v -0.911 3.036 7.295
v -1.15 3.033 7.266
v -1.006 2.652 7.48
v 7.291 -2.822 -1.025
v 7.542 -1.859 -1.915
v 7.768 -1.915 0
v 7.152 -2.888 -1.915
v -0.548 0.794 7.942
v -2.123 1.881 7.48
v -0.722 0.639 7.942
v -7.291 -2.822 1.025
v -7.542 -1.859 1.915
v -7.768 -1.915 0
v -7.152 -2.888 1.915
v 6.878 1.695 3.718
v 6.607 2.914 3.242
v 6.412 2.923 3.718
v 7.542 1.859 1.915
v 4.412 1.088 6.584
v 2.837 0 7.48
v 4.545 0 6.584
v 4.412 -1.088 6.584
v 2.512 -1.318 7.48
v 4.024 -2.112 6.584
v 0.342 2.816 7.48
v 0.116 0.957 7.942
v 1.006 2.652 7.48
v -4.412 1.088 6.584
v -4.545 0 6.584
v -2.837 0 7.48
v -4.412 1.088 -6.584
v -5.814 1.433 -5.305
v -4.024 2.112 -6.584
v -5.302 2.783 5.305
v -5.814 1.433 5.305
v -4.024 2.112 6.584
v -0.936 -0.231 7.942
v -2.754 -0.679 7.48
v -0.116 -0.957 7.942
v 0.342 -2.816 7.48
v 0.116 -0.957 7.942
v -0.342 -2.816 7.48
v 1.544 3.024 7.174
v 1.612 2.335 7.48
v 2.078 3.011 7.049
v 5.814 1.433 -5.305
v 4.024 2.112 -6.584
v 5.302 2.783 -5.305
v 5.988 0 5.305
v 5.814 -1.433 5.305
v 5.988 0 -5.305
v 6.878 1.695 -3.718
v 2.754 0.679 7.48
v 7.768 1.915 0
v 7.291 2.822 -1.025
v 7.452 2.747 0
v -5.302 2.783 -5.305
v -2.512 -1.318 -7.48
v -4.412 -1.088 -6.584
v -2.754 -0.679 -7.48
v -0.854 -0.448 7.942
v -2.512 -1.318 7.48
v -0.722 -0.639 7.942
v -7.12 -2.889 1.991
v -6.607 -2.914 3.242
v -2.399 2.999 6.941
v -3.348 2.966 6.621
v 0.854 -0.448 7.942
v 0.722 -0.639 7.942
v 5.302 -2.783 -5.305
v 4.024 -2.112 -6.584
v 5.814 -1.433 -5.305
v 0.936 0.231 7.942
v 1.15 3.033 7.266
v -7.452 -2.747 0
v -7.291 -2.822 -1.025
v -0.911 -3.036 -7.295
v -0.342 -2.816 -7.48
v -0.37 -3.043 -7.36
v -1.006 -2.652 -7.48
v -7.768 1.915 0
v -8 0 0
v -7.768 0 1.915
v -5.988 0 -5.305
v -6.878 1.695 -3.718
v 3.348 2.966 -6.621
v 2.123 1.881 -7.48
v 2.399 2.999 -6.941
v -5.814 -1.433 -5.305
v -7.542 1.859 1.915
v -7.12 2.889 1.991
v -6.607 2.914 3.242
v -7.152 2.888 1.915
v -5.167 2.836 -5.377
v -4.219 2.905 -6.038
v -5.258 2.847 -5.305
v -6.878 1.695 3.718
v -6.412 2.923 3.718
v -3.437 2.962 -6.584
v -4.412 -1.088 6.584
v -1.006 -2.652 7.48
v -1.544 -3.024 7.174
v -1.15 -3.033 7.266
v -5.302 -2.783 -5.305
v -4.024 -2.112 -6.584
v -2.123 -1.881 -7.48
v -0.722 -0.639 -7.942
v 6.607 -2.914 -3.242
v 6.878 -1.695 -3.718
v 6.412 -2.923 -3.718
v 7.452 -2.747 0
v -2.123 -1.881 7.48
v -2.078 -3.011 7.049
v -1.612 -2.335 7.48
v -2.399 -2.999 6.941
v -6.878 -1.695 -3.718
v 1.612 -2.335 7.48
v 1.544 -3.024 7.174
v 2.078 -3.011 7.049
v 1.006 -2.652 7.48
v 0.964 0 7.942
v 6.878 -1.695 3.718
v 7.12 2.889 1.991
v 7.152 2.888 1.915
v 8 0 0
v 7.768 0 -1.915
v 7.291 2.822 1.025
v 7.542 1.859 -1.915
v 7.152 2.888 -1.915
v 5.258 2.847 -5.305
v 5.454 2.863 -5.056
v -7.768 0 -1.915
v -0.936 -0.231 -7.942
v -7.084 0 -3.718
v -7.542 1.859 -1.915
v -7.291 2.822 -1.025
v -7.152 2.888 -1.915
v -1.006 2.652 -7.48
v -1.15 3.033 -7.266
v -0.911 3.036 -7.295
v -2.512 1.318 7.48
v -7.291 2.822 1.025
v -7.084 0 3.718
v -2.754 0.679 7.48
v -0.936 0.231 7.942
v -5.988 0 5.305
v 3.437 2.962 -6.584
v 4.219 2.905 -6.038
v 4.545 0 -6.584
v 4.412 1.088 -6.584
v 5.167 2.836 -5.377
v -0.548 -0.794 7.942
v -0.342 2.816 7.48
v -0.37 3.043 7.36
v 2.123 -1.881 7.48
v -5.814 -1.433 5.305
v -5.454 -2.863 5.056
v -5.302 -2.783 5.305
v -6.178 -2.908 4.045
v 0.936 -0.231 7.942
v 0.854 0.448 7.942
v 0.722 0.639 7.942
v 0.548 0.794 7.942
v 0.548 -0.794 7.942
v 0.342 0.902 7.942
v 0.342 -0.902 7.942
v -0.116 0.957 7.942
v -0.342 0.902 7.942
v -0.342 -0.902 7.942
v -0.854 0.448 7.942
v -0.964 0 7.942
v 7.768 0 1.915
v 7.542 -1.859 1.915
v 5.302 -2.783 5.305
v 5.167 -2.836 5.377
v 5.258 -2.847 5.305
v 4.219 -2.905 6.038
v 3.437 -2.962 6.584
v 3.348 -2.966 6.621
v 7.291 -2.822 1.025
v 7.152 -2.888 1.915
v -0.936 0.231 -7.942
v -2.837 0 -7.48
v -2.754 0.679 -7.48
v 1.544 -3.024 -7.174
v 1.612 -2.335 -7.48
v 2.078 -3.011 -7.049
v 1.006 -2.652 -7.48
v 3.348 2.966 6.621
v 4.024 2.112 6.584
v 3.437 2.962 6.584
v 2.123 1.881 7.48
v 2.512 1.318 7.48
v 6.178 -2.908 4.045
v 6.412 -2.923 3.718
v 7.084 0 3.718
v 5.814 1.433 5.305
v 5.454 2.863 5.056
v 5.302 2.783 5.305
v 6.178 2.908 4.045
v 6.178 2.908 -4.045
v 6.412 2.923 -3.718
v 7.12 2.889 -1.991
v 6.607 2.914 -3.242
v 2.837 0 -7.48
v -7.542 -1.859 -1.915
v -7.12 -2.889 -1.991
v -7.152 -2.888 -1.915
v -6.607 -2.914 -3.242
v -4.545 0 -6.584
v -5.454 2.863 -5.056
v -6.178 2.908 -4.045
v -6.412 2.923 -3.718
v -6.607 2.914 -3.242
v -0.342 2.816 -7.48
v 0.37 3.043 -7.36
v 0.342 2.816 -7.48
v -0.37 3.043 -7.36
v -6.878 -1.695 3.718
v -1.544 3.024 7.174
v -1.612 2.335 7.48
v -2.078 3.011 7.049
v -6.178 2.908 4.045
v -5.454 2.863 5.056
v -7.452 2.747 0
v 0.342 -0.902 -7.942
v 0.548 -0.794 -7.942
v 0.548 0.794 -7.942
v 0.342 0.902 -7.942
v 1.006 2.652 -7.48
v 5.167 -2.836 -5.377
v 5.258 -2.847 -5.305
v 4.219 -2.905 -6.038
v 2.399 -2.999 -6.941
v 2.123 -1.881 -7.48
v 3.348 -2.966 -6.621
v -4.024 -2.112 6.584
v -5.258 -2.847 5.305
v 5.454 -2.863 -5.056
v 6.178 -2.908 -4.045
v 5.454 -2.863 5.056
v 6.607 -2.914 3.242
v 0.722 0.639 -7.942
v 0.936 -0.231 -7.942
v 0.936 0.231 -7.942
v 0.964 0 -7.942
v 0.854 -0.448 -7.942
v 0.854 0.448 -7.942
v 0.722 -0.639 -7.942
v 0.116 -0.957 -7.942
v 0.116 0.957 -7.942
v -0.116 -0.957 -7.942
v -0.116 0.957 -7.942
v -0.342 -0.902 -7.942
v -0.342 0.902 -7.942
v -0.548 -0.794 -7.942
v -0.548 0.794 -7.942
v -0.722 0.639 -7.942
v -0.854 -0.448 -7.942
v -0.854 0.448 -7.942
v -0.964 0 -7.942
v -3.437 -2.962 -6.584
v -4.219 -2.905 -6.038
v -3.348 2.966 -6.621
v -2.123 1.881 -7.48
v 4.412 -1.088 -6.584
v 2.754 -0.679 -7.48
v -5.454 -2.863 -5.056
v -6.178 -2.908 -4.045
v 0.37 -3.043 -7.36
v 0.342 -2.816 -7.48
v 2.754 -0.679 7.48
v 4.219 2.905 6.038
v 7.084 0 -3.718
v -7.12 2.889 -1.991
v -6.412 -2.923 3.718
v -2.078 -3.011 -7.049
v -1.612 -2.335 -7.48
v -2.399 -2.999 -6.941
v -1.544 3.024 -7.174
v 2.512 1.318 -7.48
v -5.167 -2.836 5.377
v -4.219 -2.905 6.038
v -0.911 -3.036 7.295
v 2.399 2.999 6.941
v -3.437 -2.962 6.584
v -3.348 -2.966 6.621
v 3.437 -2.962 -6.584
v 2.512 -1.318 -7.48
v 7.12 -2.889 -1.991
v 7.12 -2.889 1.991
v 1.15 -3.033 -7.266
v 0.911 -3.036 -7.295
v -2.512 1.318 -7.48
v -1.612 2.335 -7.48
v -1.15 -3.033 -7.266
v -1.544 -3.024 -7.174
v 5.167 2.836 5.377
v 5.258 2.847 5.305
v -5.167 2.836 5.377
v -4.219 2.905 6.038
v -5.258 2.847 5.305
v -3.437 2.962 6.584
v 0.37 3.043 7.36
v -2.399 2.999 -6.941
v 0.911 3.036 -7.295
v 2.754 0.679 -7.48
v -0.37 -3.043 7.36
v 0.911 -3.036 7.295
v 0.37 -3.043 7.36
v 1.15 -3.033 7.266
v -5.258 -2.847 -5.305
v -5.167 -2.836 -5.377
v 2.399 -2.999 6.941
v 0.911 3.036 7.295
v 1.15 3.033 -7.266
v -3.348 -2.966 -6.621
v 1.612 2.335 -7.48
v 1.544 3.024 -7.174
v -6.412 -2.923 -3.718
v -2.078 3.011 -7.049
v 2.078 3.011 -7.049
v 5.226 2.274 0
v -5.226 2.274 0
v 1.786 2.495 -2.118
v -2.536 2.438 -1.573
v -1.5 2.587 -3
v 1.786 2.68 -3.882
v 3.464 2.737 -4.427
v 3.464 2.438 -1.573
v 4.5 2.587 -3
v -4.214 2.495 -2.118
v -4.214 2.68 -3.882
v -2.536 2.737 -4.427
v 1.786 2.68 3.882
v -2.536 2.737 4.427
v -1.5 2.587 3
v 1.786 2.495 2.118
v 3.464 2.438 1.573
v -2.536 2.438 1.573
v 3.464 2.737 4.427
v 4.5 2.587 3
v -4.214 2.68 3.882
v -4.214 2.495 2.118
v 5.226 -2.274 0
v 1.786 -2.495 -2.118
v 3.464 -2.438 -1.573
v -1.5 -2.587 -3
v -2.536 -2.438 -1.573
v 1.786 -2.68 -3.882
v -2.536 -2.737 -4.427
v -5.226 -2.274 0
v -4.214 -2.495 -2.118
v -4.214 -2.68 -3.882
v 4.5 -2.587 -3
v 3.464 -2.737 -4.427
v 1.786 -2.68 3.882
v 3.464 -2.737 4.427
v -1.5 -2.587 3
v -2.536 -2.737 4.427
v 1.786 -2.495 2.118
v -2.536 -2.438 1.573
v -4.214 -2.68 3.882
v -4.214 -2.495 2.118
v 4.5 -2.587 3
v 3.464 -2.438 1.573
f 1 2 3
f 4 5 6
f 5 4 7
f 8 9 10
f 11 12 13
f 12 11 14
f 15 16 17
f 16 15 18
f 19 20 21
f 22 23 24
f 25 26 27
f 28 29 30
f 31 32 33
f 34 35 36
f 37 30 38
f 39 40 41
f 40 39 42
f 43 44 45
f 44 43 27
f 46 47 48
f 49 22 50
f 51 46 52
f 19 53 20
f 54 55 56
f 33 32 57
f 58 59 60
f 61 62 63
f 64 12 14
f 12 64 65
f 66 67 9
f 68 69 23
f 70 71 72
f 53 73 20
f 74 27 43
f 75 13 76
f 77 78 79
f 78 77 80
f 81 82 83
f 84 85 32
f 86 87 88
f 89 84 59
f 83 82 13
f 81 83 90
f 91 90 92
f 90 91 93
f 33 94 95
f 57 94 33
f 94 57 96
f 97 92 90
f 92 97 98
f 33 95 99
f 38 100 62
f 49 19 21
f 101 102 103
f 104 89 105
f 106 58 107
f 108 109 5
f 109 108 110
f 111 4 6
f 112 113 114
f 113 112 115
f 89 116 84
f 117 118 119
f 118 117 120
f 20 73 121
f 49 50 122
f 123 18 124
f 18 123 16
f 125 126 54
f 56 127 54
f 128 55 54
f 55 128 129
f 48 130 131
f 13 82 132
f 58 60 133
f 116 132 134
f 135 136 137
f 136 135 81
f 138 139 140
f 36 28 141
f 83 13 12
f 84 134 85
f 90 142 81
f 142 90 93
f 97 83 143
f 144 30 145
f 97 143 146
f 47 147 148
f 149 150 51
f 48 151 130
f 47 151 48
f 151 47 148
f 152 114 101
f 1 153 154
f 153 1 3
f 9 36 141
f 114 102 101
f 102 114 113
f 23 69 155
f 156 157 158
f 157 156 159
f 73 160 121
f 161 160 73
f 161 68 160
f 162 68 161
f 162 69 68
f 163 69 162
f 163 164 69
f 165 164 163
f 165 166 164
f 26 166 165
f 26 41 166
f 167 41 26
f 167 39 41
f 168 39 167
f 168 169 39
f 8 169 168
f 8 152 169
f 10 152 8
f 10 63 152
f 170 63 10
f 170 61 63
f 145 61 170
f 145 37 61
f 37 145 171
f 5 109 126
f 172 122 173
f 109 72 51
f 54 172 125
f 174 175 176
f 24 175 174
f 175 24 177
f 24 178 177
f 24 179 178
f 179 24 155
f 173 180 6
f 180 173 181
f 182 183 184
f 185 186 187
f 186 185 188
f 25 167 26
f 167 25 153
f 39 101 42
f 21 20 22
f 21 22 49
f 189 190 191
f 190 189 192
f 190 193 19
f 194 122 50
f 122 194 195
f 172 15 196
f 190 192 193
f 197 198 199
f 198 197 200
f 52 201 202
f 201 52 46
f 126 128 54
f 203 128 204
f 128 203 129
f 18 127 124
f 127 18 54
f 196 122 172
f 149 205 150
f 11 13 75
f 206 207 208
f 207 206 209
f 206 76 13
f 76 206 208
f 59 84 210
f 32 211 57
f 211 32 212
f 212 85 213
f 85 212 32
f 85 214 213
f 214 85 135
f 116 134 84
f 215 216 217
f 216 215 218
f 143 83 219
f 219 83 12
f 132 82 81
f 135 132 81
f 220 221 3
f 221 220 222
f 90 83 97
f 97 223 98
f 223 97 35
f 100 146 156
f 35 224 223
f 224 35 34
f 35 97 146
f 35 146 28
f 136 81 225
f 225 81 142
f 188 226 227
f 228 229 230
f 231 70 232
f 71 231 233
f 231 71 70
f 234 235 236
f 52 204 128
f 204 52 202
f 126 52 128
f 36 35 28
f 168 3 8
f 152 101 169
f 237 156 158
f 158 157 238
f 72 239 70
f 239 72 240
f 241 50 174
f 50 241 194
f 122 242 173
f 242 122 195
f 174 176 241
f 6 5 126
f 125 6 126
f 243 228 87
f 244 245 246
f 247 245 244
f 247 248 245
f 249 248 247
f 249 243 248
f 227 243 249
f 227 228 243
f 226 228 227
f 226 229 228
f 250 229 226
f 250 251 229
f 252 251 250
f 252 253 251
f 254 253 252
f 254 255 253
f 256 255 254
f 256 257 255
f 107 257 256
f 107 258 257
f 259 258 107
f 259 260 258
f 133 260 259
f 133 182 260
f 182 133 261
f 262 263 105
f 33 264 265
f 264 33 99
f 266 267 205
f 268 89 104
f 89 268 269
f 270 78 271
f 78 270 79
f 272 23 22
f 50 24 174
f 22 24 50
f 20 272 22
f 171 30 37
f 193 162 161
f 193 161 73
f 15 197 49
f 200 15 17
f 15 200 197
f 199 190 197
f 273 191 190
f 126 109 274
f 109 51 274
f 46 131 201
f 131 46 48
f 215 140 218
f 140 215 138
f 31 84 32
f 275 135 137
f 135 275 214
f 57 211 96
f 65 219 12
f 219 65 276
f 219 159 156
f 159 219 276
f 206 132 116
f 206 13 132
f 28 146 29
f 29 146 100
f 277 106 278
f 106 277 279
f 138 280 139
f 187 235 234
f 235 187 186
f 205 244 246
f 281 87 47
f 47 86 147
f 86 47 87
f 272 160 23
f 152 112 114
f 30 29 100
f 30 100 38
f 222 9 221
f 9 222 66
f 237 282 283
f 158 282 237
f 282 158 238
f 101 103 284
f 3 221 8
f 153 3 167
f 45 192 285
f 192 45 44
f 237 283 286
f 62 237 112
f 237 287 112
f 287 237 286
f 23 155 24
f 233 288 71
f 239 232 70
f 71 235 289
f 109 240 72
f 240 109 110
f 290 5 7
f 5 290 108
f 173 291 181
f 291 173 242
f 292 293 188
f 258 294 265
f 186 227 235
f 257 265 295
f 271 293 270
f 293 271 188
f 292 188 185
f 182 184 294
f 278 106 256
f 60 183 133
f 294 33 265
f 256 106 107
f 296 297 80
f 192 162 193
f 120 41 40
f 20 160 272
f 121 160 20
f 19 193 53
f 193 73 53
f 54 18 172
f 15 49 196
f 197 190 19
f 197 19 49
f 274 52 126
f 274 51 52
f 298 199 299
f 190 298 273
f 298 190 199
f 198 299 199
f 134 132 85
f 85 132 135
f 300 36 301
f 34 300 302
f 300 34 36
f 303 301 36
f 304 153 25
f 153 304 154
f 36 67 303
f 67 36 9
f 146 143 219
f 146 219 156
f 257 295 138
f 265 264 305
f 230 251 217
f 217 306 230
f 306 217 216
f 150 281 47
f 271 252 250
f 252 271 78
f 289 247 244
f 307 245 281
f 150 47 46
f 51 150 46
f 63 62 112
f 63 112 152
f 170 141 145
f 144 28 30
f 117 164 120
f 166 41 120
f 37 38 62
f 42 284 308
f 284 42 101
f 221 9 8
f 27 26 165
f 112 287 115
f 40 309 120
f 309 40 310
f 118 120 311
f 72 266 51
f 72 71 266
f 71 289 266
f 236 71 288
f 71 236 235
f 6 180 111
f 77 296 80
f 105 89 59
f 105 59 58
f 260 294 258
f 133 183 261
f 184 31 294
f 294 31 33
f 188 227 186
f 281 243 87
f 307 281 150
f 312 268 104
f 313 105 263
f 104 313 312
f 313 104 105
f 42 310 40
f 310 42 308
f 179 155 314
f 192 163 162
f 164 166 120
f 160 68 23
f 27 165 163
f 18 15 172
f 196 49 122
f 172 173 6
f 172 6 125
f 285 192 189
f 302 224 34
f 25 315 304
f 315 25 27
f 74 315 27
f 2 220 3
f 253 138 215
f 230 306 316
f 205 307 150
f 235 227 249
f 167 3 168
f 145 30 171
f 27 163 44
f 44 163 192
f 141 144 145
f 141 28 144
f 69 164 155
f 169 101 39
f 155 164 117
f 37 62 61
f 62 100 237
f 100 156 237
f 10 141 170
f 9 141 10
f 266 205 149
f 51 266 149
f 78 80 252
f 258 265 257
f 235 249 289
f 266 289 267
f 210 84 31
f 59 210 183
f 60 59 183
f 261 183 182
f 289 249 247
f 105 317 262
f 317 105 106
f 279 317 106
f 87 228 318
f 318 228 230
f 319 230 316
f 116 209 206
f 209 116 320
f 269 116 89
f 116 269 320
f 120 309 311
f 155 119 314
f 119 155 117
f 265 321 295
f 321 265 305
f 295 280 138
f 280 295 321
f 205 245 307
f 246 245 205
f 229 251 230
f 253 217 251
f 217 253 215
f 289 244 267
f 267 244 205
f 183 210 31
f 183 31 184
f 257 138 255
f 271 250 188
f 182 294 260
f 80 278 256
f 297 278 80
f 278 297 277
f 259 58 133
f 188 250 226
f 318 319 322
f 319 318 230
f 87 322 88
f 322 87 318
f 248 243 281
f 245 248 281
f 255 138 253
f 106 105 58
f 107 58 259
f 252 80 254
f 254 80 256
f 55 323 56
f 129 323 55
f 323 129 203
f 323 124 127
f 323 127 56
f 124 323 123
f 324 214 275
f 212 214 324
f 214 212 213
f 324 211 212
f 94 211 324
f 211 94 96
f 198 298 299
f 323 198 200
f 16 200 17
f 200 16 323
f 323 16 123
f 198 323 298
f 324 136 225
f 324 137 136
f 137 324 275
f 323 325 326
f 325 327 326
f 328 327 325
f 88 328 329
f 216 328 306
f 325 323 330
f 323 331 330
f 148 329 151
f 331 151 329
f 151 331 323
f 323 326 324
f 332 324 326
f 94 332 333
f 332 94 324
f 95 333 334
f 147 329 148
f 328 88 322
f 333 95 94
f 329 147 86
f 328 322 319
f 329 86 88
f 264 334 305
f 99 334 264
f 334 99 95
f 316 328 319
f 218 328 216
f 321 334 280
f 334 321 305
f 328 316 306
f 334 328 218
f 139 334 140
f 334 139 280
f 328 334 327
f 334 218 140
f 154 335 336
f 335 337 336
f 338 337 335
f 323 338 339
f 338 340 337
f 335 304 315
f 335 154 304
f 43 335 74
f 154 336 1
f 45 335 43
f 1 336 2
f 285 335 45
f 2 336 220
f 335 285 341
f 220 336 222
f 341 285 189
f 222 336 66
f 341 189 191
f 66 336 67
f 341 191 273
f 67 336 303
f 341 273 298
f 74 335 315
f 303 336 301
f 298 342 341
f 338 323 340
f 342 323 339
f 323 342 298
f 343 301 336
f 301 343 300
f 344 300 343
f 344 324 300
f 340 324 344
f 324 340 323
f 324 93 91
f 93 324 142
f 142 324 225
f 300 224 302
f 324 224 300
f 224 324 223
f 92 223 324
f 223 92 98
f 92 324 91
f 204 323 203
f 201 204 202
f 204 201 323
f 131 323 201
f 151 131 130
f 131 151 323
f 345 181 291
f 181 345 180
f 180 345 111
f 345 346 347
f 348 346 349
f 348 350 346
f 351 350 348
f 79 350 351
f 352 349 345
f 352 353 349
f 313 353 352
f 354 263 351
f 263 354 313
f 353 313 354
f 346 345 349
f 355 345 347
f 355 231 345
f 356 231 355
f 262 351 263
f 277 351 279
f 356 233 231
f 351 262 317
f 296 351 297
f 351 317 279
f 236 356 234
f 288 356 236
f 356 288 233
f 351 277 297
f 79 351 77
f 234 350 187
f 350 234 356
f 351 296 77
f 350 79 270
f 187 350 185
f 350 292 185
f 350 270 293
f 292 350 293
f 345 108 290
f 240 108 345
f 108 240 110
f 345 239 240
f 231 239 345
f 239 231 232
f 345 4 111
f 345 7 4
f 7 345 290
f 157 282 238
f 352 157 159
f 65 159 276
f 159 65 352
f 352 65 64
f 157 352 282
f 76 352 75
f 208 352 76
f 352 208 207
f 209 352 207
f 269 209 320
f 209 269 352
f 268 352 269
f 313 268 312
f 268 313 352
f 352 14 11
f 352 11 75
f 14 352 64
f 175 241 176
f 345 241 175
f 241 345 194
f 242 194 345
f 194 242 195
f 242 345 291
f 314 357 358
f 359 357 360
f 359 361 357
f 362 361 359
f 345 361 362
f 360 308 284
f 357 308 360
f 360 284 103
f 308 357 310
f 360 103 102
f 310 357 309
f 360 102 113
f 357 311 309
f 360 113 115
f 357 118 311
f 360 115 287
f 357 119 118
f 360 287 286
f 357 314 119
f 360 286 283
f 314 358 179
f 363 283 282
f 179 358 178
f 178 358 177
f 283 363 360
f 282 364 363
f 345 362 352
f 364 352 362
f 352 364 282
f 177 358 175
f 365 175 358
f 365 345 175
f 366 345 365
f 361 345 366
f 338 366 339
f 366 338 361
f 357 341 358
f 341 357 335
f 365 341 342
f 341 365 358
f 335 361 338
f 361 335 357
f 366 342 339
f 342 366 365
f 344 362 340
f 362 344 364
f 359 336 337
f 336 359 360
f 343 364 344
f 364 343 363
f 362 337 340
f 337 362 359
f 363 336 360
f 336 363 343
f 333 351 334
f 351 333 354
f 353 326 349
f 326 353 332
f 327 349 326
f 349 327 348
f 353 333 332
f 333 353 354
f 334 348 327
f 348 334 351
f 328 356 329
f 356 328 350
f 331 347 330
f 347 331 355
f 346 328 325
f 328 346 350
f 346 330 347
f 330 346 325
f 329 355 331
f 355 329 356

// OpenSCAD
module wheel(){
    
    wheel_radius = 8;
    side_spheres_radius= 50;
    hub_thickness = 4;
    side_offset = side_spheres_radius +hub_thickness/2;

    hole_thickness = 1.5;
    hole_offset = 3;
    
    difference(){
        sphere(r=wheel_radius, center=true);
        
        //cut to size
        translate([0, side_offset, 0]){
            sphere(r=side_spheres_radius, center=true);
        }
        translate([0,-side_offset,0]) {
            sphere(r=side_spheres_radius, center=true);
        } 
       
        //holes
        translate([hole_offset, 0, hole_offset]){
                rotate([90, 0, 0]){
        cylinder(r=hole_thickness, h=hub_thickness*2, center=true);
            
            }
        }
        translate([-hole_offset, 0, hole_offset]){
                rotate([90, 0, 0]){
        cylinder(r=hole_thickness, h=hub_thickness*2, center=true);
            
            }
        }
        translate([-hole_offset, 0, -hole_offset]){
                rotate([90, 0, 0]){
        cylinder(r=hole_thickness, h=hub_thickness*2, center=true);
            
            }
        }
        translate([hole_offset, 0, -hole_offset]){
                rotate([90, 0, 0]){
        cylinder(r=hole_thickness, h=hub_thickness*2, center=true);
            
            }
        }
    }
}
wheel();   



//union(){
//    translate([0, 50, 0]){
//sphere(r=10);
//translate([10, 0, 0])
//    sphere(r=10);
//    }
//}
//
//
//translate([0, 0, 50]){
//difference(){  
//sphere(r=10);
//translate([10, 0, 0])
//    sphere(r=10);
// translate([0, -12, 0])
//    sphere(r=10);
//    }
//}
//
//
//translate([100, 0, 0]){
//intersection(){
//sphere(r=10);
//translate([10, 0, 0])
//    sphere(r=10);
// //translate([0, -12, 0])
//   // sphere(r=10);
//}
//}
